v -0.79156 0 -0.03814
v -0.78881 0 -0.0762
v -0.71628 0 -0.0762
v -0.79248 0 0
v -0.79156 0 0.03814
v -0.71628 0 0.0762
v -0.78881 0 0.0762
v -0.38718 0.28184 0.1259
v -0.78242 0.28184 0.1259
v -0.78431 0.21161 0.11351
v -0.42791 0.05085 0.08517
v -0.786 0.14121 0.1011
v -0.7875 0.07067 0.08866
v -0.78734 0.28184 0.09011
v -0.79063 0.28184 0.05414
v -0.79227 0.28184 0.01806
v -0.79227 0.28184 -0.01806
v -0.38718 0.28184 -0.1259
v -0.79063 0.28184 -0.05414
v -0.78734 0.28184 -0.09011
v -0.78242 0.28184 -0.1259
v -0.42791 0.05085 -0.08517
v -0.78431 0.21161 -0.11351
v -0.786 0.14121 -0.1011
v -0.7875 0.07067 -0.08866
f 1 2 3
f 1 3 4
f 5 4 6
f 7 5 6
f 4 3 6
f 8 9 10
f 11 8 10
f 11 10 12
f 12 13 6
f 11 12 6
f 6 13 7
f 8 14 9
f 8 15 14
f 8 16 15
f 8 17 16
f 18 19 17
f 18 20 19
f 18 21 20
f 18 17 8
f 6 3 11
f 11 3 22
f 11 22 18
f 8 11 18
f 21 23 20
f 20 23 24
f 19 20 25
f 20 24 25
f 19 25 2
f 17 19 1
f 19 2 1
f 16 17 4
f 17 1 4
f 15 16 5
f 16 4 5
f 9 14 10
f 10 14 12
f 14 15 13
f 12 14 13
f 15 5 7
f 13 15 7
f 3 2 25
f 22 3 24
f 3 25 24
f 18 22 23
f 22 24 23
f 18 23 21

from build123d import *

# Parameters (mm, degrees)
TD_SKETCH_R                           = 0.79248
TL_FEATURE_DEPTH                      = 21.0312
TDF_180_DEG_REV_SKETCH_W              = 1.60495996
TDF_180_DEG_REV_SKETCH_H              = 1.60495996
TDF_180_DEG_REV_FEATURE_DEPTH         = 22.061040395
ISA_20_180_DEG_REV_FEATURE_DEPTH      = 22.061040395
ISA_20_180_DEG_REV_FEATURE_DEPTH_BACK = 22.061040395
F_10BA_180_DEG_REV_FEATURE_DEPTH      = 22.061040395
F_10BA_180_DEG_REV_FEATURE_DEPTH_BACK = 22.061040395


with BuildPart() as part:
    # TD_sketch → TL_feature (new body)
    with BuildSketch(Plane(origin=(0, 0, 0), x_dir=(1, 0, 0), z_dir=(0, 1, 0))):
        with Locations(Location((0, 0, 0), (0, 0, 270))):
            Circle(TD_SKETCH_R)
    extrude(amount=TL_FEATURE_DEPTH)

    # TDF_180_DEG_REV_sketch → TDF_180_DEG_REV_feature (cut, through all)
    with BuildSketch(Plane(origin=(0, 0, 0), x_dir=(1, 0, 0), z_dir=(0, 1, 0))):
        with Locations((1.17839998, 0)):
            Rectangle(TDF_180_DEG_REV_SKETCH_W, TDF_180_DEG_REV_SKETCH_H)
    extrude(amount=TDF_180_DEG_REV_FEATURE_DEPTH, mode=Mode.SUBTRACT)

    # ISA_20_180_DEG_REV_sketch → ISA_20_180_DEG_REV_feature (cut, two sides: drawn at the far end of the back side and taken through both)
    with BuildSketch(Plane(origin=(0, 0, 0), x_dir=(0, 0, -1), z_dir=(1, 0, 0)).offset(-ISA_20_180_DEG_REV_FEATURE_DEPTH_BACK)):
        Polygon((-12.996080373, 73.27228267), (-3.784567997, 21.0312), (-0.0762, 0), (0.0762, 0), (3.784567997, 21.0312), (12.996080373, 73.27228267), (12.996080373, -32.821688483), (-12.996080373, -32.821688483), align=None)
    extrude(amount=ISA_20_180_DEG_REV_FEATURE_DEPTH + ISA_20_180_DEG_REV_FEATURE_DEPTH_BACK, mode=Mode.SUBTRACT)

    # 10BA_180_DEG_REV_sketch → 10BA_180_DEG_REV_feature (cut, two sides: drawn at the far end of the back side and taken through both)
    with BuildSketch(Plane.XY.offset(-F_10BA_180_DEG_REV_FEATURE_DEPTH_BACK)):
        Polygon((-53.632984634, 0), (-0.79248, 0), (-0.71628, 0), (-0.427914365, 0.050846642), (3.271487997, 21.0312), (12.447145333, 73.068938636), (90.829329802, 2.18375769), (24.749199835, -70.885180946), align=None)
    extrude(amount=F_10BA_180_DEG_REV_FEATURE_DEPTH + F_10BA_180_DEG_REV_FEATURE_DEPTH_BACK, mode=Mode.SUBTRACT)

    # cut_feature
    split(bisect_by=Plane(origin=(0, 0.281844732, 0), x_dir=(1, 0, 0), z_dir=(0, 1, 0)), keep=Keep.BOTTOM)


solid = part.part
